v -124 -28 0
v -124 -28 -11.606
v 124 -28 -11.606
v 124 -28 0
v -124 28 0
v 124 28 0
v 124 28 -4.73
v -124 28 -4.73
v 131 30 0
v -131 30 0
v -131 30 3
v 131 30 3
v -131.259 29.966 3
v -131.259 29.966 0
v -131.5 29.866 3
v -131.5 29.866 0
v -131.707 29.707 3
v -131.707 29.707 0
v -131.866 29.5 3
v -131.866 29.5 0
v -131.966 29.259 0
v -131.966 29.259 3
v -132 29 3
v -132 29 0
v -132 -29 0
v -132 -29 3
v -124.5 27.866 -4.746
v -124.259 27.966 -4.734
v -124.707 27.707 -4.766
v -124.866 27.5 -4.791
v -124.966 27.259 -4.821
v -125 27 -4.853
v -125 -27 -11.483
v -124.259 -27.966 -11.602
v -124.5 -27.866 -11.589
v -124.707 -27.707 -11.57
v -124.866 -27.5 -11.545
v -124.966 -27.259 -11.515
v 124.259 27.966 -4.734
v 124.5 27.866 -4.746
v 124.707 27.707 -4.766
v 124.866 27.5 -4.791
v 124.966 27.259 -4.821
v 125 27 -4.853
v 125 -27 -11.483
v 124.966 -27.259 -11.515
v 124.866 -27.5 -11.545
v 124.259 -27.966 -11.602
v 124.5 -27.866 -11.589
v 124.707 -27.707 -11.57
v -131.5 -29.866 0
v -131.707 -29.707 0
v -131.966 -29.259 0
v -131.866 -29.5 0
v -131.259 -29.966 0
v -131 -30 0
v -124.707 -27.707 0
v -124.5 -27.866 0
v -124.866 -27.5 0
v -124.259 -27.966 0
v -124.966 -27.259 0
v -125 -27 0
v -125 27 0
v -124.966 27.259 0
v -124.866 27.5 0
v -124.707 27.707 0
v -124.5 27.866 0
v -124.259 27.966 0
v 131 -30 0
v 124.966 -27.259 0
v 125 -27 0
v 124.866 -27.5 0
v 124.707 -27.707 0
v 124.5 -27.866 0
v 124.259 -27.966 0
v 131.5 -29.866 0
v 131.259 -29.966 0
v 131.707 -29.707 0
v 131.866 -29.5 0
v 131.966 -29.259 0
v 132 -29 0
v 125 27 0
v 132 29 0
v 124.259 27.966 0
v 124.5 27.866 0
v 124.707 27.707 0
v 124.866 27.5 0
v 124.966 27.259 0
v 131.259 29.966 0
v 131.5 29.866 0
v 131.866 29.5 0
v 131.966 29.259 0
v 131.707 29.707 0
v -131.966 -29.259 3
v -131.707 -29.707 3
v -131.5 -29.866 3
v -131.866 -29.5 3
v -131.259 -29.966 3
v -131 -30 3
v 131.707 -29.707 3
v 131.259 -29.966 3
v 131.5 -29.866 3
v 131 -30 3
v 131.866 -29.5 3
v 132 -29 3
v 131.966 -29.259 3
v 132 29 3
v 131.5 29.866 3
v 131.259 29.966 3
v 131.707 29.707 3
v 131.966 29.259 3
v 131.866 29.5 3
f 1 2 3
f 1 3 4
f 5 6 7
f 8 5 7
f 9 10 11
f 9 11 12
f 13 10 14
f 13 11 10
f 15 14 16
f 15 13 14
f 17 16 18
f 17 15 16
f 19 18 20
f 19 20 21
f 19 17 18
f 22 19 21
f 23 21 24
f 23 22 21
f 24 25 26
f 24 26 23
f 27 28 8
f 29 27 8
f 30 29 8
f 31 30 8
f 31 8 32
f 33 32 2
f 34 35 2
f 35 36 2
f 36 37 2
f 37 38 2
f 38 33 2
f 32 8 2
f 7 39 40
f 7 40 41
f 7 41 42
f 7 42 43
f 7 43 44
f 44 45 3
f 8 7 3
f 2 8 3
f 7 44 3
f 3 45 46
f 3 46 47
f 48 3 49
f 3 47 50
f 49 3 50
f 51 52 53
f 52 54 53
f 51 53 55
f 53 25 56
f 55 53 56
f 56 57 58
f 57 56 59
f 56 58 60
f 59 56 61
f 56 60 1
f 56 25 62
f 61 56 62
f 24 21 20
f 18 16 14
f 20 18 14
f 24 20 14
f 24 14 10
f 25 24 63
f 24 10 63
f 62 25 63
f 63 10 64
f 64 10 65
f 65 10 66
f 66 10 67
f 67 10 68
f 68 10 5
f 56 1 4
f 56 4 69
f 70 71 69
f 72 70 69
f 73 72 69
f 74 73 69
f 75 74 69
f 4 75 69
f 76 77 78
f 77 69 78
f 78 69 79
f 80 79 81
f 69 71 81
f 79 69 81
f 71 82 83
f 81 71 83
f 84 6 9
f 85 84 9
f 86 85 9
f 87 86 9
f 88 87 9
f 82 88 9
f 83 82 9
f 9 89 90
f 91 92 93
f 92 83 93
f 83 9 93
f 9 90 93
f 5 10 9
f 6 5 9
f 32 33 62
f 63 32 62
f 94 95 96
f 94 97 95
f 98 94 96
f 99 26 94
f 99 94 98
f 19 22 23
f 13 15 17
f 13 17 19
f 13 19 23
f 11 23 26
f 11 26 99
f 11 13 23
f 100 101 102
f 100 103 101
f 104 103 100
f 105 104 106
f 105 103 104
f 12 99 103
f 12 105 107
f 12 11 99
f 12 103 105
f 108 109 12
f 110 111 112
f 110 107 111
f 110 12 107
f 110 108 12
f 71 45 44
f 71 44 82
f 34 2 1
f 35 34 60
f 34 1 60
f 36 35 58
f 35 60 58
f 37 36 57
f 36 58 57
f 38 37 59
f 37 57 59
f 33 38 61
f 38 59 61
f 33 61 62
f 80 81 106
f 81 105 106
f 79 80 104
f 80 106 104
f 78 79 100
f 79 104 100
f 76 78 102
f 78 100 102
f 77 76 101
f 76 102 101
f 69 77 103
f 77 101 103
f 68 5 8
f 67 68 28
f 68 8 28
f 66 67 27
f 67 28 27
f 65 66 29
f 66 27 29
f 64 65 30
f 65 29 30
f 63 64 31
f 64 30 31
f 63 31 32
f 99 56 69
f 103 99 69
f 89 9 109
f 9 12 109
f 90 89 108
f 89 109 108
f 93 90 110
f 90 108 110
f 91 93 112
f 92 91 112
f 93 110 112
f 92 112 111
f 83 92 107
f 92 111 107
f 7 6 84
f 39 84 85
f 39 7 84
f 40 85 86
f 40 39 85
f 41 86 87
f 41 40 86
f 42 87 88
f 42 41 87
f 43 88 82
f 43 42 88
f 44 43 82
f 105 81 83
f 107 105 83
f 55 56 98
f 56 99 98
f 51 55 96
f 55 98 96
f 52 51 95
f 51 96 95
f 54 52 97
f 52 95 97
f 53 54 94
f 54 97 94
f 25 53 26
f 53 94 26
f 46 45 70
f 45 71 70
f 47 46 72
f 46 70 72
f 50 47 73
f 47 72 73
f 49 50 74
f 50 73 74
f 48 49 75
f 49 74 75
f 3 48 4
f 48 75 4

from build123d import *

# Parameters (mm, degrees)
SKETCH1_W                = 264
SKETCH1_H                = 60
BOSS_EXTRUDE1_DEPTH      = 3
BOSS_EXTRUDE2_DEPTH      = 125
BOSS_EXTRUDE2_DEPTH_BACK = 125
FILLET1_R                = 1


with BuildPart() as part:
    # Sketch1 → Boss-Extrude1 (new body)
    with BuildSketch(Plane.XY):
        Rectangle(SKETCH1_W, SKETCH1_H)
    extrude(amount=BOSS_EXTRUDE1_DEPTH)

    # Sketch2 → Boss-Extrude2 (add, two sides)
    with BuildSketch(Plane(origin=(0, 0, 0), x_dir=(0, 0, -1), z_dir=(1, 0, 0))) as boss_extrude2_sk:
        Polygon((0, 28), (4.73, 28), (11.605935411, -28), (0, -28), align=None)
    extrude(amount=BOSS_EXTRUDE2_DEPTH)
    extrude(boss_extrude2_sk.sketch, amount=-BOSS_EXTRUDE2_DEPTH_BACK)

    # Fillet1
    fillet1_edges = [part.edges().sort_by_distance(p)[0] for p in [
        (125, 28, -2.365),
        (125, -28, -5.802967705),
        (-125, 28, -2.365),
        (-125, -28, -5.802967705),
        (-132, 30, 1.5),
        (132, 30, 1.5),
        (132, -30, 1.5),
        (-132, -30, 1.5),
    ]]
    fillet(fillet1_edges, radius=FILLET1_R)


solid = part.part
